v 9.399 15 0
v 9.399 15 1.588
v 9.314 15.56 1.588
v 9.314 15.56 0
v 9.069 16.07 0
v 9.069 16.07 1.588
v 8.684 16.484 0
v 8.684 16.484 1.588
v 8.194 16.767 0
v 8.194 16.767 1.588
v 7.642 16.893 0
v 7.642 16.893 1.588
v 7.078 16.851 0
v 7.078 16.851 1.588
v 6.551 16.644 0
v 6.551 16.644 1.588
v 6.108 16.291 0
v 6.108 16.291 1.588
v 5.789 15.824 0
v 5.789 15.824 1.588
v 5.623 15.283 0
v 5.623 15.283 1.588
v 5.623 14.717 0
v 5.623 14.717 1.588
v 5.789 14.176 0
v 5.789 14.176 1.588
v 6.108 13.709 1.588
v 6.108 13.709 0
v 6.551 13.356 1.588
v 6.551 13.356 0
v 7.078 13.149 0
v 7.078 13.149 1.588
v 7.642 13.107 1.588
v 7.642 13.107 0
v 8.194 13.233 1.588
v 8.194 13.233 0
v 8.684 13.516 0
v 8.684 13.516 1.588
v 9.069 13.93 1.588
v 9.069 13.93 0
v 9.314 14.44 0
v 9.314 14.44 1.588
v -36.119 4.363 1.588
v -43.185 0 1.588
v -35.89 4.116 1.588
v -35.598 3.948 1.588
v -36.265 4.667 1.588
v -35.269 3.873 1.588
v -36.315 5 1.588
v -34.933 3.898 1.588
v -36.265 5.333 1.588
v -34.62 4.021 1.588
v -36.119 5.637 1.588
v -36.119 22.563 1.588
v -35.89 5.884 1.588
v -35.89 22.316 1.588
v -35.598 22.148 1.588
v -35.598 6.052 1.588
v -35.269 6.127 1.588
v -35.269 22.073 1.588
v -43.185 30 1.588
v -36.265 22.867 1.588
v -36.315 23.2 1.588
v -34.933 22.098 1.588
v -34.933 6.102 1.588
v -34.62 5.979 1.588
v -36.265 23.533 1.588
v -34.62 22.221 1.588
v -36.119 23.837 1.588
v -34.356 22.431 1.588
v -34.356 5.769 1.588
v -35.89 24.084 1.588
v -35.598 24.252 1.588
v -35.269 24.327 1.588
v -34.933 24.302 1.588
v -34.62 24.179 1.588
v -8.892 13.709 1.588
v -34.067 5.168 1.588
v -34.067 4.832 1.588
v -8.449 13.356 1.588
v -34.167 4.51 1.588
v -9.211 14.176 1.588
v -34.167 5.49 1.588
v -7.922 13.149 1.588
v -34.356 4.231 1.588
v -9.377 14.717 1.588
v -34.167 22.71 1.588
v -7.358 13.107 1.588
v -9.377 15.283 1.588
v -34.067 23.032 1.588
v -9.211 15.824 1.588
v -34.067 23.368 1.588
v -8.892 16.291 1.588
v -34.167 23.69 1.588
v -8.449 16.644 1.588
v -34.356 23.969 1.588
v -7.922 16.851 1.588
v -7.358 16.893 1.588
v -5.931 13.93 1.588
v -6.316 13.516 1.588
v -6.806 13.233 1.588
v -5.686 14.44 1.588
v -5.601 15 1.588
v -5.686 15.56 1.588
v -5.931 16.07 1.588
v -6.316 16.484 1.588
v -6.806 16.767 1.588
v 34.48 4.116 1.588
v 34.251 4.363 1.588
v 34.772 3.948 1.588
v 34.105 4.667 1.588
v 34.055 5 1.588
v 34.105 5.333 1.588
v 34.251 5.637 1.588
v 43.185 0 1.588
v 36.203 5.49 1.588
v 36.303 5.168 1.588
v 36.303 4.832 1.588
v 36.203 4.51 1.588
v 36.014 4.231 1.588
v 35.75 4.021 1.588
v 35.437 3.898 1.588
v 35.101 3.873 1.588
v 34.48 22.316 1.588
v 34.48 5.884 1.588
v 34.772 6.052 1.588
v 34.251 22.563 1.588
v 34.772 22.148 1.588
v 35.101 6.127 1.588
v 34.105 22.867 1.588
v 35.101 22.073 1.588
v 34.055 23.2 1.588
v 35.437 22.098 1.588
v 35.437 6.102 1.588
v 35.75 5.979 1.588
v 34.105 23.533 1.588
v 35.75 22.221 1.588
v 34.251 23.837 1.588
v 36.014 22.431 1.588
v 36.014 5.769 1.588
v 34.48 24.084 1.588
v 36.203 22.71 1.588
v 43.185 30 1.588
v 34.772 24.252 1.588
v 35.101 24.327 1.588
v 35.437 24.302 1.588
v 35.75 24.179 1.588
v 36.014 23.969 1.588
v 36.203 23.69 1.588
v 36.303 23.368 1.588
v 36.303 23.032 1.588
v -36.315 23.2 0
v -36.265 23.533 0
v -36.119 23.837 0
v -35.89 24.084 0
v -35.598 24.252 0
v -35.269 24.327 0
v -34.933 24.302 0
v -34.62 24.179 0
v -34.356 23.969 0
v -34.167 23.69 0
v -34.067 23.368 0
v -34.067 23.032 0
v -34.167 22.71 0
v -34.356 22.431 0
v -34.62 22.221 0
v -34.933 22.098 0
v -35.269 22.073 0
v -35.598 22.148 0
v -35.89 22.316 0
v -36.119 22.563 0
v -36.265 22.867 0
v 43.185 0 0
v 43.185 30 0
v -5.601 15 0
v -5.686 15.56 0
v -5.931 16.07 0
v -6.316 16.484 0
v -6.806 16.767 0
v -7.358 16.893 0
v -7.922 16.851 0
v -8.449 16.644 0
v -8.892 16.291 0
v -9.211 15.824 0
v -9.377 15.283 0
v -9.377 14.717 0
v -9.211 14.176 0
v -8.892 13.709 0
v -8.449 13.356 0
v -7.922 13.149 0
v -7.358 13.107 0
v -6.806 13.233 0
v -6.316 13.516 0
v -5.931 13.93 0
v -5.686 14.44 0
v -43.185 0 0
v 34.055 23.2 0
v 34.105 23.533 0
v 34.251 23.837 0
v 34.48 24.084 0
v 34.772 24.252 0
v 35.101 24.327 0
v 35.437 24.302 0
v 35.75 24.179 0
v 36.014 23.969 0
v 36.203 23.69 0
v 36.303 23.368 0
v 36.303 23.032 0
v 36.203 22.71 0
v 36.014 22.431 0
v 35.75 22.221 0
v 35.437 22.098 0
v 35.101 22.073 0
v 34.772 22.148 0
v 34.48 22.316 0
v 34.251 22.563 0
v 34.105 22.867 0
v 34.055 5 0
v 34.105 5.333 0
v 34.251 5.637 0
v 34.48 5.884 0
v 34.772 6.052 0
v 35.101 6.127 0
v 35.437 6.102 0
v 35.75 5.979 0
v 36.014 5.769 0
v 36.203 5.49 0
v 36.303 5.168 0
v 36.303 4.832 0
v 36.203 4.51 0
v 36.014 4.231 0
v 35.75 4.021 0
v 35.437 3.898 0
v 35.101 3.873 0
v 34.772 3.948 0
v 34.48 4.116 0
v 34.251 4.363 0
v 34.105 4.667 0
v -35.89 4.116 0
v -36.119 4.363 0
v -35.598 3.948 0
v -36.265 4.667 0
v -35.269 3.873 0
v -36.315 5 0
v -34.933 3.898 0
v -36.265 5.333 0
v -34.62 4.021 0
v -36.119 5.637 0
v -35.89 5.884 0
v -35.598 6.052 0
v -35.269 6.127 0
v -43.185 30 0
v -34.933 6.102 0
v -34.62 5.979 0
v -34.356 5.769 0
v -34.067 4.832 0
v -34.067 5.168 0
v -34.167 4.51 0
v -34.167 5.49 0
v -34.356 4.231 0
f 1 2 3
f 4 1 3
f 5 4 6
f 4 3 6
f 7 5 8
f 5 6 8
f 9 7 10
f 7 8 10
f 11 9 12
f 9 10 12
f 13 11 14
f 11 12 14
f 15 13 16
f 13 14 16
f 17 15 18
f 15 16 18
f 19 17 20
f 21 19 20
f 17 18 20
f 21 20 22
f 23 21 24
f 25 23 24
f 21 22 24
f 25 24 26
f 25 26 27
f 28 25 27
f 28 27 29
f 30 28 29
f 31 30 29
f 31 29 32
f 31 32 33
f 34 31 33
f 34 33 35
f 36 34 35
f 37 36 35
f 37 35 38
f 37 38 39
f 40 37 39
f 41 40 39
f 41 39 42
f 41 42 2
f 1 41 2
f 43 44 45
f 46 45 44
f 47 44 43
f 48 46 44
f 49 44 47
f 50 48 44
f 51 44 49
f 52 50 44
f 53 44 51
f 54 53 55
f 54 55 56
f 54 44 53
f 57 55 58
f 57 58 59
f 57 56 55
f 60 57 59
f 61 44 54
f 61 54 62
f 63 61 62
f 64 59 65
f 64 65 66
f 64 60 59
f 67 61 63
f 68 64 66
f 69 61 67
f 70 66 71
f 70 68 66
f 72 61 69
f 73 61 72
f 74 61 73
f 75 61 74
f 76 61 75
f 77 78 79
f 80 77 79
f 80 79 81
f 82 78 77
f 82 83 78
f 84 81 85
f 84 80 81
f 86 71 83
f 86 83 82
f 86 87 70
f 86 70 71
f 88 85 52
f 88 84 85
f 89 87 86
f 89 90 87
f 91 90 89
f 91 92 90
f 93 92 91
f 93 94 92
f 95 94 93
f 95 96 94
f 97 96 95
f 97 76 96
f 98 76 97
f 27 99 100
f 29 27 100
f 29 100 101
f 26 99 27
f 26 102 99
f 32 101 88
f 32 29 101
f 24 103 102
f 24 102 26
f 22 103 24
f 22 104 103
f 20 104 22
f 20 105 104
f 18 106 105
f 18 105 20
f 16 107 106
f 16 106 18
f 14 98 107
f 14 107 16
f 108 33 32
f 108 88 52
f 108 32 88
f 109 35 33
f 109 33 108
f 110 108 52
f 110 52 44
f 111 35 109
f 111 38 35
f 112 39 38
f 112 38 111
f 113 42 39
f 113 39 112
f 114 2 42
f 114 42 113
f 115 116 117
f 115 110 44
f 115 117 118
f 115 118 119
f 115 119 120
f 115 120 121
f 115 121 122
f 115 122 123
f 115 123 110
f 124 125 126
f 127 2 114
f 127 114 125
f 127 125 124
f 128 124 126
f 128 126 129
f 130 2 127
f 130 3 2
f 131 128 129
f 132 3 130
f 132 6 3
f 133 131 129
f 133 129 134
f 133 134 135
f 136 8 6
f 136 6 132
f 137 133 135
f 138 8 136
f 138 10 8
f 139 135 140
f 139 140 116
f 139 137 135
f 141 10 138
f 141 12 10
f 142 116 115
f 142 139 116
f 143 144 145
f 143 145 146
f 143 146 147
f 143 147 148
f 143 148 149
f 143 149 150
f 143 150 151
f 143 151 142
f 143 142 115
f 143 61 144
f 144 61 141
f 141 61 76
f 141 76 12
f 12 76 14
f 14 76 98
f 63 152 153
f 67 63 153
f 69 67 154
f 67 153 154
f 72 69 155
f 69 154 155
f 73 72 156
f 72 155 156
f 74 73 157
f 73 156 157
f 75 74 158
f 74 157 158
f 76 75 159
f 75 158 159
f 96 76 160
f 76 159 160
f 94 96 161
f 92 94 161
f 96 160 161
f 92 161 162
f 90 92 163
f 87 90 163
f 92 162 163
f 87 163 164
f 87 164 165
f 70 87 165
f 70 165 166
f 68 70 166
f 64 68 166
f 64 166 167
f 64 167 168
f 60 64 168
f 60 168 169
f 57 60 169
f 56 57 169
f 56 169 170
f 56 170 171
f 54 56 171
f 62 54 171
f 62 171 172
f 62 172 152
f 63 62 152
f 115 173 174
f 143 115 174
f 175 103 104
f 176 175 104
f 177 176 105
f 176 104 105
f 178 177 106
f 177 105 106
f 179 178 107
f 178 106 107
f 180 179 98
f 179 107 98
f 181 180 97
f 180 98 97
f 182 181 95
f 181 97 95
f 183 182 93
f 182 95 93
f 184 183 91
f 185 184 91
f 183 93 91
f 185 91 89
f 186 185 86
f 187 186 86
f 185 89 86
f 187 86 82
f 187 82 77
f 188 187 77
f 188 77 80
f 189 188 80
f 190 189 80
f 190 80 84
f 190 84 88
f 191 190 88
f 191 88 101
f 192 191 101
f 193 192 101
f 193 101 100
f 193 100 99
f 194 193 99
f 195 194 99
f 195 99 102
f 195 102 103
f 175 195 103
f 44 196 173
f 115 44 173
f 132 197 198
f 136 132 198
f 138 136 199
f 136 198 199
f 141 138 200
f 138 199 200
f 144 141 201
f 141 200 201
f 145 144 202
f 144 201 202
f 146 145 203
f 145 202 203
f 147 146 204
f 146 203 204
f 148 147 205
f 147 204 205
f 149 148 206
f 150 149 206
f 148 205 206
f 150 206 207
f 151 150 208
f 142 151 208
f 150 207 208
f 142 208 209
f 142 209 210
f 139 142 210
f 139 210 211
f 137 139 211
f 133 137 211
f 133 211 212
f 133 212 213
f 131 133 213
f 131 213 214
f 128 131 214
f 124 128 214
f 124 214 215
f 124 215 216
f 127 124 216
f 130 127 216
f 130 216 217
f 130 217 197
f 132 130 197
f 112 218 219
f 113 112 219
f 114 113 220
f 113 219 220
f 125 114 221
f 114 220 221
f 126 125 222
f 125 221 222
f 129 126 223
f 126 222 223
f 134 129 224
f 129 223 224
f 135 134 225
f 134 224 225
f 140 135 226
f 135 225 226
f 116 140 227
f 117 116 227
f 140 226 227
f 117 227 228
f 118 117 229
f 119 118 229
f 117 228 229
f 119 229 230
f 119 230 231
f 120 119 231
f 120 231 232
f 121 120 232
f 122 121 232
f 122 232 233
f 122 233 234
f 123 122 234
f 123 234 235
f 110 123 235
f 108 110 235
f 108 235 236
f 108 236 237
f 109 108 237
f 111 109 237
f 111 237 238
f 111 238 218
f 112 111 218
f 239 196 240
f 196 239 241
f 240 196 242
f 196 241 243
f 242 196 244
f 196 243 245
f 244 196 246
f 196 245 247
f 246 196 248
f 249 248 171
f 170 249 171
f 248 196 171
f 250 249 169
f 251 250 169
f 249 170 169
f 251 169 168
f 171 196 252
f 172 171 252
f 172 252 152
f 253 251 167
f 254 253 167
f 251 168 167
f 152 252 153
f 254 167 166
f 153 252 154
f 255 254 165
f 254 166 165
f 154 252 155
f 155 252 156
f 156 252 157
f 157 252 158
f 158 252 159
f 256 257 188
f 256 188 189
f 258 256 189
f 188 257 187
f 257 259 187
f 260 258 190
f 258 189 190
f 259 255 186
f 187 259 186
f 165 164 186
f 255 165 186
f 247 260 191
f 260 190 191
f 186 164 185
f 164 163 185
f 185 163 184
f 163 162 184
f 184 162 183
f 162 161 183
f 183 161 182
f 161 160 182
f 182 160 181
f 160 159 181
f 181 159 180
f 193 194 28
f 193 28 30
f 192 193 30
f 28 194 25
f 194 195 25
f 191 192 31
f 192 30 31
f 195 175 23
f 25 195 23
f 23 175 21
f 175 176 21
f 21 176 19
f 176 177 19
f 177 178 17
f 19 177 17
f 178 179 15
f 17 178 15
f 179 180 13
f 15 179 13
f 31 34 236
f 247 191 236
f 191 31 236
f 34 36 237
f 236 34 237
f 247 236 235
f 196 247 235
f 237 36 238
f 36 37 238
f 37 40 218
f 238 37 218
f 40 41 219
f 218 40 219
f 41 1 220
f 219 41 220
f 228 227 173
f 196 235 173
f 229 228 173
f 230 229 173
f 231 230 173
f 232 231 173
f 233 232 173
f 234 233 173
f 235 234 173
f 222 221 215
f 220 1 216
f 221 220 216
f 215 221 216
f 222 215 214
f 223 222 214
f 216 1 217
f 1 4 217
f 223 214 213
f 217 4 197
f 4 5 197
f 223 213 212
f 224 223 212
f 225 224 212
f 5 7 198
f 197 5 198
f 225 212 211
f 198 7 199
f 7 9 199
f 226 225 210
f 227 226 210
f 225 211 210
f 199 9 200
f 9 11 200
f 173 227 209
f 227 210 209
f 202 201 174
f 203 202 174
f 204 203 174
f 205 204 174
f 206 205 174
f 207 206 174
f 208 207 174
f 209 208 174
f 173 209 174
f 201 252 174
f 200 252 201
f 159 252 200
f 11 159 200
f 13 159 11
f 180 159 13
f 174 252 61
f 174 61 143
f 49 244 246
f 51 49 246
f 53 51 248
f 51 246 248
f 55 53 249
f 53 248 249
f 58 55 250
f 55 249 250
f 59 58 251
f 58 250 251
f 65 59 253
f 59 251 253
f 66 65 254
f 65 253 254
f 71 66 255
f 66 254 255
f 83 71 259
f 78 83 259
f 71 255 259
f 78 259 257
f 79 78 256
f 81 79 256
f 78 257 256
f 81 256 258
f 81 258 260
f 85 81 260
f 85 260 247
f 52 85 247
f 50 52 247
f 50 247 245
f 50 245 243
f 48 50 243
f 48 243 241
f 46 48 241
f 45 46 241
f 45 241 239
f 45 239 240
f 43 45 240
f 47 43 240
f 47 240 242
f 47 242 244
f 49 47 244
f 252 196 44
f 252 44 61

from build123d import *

# Parameters (mm, degrees)
SKETCH2_W             = 86.37
SKETCH2_H             = 30
BOSS_EXTRUDE1_DEPTH   = 1.5875
F_1_CLEARANCE_HOLE1_D = 2.2606
F_6_CLEARANCE_HOLE1_D = 3.7973


with BuildPart() as part:
    # Sketch2 → Boss-Extrude1 (new body)
    with BuildSketch(Plane.XY):
        with Locations((0, 15)):
            Rectangle(SKETCH2_W, SKETCH2_H)
    extrude(amount=BOSS_EXTRUDE1_DEPTH)

    # #1 Clearance Hole1 (through all)
    with Locations(Plane.XY.offset(1.5875)):
        with Locations((35.185, 23.2), (35.185, 5), (-35.185, 5), (-35.185, 23.2)):
            Hole(F_1_CLEARANCE_HOLE1_D / 2)

    # #6 Clearance Hole1 (through all)
    with Locations(Plane(origin=(0, 0, 0), x_dir=(-1, 0, 0), z_dir=(0, 0, -1))):
        with Locations((7.5, 15), (-7.5, 15)):
            Hole(F_6_CLEARANCE_HOLE1_D / 2)


solid = part.part
